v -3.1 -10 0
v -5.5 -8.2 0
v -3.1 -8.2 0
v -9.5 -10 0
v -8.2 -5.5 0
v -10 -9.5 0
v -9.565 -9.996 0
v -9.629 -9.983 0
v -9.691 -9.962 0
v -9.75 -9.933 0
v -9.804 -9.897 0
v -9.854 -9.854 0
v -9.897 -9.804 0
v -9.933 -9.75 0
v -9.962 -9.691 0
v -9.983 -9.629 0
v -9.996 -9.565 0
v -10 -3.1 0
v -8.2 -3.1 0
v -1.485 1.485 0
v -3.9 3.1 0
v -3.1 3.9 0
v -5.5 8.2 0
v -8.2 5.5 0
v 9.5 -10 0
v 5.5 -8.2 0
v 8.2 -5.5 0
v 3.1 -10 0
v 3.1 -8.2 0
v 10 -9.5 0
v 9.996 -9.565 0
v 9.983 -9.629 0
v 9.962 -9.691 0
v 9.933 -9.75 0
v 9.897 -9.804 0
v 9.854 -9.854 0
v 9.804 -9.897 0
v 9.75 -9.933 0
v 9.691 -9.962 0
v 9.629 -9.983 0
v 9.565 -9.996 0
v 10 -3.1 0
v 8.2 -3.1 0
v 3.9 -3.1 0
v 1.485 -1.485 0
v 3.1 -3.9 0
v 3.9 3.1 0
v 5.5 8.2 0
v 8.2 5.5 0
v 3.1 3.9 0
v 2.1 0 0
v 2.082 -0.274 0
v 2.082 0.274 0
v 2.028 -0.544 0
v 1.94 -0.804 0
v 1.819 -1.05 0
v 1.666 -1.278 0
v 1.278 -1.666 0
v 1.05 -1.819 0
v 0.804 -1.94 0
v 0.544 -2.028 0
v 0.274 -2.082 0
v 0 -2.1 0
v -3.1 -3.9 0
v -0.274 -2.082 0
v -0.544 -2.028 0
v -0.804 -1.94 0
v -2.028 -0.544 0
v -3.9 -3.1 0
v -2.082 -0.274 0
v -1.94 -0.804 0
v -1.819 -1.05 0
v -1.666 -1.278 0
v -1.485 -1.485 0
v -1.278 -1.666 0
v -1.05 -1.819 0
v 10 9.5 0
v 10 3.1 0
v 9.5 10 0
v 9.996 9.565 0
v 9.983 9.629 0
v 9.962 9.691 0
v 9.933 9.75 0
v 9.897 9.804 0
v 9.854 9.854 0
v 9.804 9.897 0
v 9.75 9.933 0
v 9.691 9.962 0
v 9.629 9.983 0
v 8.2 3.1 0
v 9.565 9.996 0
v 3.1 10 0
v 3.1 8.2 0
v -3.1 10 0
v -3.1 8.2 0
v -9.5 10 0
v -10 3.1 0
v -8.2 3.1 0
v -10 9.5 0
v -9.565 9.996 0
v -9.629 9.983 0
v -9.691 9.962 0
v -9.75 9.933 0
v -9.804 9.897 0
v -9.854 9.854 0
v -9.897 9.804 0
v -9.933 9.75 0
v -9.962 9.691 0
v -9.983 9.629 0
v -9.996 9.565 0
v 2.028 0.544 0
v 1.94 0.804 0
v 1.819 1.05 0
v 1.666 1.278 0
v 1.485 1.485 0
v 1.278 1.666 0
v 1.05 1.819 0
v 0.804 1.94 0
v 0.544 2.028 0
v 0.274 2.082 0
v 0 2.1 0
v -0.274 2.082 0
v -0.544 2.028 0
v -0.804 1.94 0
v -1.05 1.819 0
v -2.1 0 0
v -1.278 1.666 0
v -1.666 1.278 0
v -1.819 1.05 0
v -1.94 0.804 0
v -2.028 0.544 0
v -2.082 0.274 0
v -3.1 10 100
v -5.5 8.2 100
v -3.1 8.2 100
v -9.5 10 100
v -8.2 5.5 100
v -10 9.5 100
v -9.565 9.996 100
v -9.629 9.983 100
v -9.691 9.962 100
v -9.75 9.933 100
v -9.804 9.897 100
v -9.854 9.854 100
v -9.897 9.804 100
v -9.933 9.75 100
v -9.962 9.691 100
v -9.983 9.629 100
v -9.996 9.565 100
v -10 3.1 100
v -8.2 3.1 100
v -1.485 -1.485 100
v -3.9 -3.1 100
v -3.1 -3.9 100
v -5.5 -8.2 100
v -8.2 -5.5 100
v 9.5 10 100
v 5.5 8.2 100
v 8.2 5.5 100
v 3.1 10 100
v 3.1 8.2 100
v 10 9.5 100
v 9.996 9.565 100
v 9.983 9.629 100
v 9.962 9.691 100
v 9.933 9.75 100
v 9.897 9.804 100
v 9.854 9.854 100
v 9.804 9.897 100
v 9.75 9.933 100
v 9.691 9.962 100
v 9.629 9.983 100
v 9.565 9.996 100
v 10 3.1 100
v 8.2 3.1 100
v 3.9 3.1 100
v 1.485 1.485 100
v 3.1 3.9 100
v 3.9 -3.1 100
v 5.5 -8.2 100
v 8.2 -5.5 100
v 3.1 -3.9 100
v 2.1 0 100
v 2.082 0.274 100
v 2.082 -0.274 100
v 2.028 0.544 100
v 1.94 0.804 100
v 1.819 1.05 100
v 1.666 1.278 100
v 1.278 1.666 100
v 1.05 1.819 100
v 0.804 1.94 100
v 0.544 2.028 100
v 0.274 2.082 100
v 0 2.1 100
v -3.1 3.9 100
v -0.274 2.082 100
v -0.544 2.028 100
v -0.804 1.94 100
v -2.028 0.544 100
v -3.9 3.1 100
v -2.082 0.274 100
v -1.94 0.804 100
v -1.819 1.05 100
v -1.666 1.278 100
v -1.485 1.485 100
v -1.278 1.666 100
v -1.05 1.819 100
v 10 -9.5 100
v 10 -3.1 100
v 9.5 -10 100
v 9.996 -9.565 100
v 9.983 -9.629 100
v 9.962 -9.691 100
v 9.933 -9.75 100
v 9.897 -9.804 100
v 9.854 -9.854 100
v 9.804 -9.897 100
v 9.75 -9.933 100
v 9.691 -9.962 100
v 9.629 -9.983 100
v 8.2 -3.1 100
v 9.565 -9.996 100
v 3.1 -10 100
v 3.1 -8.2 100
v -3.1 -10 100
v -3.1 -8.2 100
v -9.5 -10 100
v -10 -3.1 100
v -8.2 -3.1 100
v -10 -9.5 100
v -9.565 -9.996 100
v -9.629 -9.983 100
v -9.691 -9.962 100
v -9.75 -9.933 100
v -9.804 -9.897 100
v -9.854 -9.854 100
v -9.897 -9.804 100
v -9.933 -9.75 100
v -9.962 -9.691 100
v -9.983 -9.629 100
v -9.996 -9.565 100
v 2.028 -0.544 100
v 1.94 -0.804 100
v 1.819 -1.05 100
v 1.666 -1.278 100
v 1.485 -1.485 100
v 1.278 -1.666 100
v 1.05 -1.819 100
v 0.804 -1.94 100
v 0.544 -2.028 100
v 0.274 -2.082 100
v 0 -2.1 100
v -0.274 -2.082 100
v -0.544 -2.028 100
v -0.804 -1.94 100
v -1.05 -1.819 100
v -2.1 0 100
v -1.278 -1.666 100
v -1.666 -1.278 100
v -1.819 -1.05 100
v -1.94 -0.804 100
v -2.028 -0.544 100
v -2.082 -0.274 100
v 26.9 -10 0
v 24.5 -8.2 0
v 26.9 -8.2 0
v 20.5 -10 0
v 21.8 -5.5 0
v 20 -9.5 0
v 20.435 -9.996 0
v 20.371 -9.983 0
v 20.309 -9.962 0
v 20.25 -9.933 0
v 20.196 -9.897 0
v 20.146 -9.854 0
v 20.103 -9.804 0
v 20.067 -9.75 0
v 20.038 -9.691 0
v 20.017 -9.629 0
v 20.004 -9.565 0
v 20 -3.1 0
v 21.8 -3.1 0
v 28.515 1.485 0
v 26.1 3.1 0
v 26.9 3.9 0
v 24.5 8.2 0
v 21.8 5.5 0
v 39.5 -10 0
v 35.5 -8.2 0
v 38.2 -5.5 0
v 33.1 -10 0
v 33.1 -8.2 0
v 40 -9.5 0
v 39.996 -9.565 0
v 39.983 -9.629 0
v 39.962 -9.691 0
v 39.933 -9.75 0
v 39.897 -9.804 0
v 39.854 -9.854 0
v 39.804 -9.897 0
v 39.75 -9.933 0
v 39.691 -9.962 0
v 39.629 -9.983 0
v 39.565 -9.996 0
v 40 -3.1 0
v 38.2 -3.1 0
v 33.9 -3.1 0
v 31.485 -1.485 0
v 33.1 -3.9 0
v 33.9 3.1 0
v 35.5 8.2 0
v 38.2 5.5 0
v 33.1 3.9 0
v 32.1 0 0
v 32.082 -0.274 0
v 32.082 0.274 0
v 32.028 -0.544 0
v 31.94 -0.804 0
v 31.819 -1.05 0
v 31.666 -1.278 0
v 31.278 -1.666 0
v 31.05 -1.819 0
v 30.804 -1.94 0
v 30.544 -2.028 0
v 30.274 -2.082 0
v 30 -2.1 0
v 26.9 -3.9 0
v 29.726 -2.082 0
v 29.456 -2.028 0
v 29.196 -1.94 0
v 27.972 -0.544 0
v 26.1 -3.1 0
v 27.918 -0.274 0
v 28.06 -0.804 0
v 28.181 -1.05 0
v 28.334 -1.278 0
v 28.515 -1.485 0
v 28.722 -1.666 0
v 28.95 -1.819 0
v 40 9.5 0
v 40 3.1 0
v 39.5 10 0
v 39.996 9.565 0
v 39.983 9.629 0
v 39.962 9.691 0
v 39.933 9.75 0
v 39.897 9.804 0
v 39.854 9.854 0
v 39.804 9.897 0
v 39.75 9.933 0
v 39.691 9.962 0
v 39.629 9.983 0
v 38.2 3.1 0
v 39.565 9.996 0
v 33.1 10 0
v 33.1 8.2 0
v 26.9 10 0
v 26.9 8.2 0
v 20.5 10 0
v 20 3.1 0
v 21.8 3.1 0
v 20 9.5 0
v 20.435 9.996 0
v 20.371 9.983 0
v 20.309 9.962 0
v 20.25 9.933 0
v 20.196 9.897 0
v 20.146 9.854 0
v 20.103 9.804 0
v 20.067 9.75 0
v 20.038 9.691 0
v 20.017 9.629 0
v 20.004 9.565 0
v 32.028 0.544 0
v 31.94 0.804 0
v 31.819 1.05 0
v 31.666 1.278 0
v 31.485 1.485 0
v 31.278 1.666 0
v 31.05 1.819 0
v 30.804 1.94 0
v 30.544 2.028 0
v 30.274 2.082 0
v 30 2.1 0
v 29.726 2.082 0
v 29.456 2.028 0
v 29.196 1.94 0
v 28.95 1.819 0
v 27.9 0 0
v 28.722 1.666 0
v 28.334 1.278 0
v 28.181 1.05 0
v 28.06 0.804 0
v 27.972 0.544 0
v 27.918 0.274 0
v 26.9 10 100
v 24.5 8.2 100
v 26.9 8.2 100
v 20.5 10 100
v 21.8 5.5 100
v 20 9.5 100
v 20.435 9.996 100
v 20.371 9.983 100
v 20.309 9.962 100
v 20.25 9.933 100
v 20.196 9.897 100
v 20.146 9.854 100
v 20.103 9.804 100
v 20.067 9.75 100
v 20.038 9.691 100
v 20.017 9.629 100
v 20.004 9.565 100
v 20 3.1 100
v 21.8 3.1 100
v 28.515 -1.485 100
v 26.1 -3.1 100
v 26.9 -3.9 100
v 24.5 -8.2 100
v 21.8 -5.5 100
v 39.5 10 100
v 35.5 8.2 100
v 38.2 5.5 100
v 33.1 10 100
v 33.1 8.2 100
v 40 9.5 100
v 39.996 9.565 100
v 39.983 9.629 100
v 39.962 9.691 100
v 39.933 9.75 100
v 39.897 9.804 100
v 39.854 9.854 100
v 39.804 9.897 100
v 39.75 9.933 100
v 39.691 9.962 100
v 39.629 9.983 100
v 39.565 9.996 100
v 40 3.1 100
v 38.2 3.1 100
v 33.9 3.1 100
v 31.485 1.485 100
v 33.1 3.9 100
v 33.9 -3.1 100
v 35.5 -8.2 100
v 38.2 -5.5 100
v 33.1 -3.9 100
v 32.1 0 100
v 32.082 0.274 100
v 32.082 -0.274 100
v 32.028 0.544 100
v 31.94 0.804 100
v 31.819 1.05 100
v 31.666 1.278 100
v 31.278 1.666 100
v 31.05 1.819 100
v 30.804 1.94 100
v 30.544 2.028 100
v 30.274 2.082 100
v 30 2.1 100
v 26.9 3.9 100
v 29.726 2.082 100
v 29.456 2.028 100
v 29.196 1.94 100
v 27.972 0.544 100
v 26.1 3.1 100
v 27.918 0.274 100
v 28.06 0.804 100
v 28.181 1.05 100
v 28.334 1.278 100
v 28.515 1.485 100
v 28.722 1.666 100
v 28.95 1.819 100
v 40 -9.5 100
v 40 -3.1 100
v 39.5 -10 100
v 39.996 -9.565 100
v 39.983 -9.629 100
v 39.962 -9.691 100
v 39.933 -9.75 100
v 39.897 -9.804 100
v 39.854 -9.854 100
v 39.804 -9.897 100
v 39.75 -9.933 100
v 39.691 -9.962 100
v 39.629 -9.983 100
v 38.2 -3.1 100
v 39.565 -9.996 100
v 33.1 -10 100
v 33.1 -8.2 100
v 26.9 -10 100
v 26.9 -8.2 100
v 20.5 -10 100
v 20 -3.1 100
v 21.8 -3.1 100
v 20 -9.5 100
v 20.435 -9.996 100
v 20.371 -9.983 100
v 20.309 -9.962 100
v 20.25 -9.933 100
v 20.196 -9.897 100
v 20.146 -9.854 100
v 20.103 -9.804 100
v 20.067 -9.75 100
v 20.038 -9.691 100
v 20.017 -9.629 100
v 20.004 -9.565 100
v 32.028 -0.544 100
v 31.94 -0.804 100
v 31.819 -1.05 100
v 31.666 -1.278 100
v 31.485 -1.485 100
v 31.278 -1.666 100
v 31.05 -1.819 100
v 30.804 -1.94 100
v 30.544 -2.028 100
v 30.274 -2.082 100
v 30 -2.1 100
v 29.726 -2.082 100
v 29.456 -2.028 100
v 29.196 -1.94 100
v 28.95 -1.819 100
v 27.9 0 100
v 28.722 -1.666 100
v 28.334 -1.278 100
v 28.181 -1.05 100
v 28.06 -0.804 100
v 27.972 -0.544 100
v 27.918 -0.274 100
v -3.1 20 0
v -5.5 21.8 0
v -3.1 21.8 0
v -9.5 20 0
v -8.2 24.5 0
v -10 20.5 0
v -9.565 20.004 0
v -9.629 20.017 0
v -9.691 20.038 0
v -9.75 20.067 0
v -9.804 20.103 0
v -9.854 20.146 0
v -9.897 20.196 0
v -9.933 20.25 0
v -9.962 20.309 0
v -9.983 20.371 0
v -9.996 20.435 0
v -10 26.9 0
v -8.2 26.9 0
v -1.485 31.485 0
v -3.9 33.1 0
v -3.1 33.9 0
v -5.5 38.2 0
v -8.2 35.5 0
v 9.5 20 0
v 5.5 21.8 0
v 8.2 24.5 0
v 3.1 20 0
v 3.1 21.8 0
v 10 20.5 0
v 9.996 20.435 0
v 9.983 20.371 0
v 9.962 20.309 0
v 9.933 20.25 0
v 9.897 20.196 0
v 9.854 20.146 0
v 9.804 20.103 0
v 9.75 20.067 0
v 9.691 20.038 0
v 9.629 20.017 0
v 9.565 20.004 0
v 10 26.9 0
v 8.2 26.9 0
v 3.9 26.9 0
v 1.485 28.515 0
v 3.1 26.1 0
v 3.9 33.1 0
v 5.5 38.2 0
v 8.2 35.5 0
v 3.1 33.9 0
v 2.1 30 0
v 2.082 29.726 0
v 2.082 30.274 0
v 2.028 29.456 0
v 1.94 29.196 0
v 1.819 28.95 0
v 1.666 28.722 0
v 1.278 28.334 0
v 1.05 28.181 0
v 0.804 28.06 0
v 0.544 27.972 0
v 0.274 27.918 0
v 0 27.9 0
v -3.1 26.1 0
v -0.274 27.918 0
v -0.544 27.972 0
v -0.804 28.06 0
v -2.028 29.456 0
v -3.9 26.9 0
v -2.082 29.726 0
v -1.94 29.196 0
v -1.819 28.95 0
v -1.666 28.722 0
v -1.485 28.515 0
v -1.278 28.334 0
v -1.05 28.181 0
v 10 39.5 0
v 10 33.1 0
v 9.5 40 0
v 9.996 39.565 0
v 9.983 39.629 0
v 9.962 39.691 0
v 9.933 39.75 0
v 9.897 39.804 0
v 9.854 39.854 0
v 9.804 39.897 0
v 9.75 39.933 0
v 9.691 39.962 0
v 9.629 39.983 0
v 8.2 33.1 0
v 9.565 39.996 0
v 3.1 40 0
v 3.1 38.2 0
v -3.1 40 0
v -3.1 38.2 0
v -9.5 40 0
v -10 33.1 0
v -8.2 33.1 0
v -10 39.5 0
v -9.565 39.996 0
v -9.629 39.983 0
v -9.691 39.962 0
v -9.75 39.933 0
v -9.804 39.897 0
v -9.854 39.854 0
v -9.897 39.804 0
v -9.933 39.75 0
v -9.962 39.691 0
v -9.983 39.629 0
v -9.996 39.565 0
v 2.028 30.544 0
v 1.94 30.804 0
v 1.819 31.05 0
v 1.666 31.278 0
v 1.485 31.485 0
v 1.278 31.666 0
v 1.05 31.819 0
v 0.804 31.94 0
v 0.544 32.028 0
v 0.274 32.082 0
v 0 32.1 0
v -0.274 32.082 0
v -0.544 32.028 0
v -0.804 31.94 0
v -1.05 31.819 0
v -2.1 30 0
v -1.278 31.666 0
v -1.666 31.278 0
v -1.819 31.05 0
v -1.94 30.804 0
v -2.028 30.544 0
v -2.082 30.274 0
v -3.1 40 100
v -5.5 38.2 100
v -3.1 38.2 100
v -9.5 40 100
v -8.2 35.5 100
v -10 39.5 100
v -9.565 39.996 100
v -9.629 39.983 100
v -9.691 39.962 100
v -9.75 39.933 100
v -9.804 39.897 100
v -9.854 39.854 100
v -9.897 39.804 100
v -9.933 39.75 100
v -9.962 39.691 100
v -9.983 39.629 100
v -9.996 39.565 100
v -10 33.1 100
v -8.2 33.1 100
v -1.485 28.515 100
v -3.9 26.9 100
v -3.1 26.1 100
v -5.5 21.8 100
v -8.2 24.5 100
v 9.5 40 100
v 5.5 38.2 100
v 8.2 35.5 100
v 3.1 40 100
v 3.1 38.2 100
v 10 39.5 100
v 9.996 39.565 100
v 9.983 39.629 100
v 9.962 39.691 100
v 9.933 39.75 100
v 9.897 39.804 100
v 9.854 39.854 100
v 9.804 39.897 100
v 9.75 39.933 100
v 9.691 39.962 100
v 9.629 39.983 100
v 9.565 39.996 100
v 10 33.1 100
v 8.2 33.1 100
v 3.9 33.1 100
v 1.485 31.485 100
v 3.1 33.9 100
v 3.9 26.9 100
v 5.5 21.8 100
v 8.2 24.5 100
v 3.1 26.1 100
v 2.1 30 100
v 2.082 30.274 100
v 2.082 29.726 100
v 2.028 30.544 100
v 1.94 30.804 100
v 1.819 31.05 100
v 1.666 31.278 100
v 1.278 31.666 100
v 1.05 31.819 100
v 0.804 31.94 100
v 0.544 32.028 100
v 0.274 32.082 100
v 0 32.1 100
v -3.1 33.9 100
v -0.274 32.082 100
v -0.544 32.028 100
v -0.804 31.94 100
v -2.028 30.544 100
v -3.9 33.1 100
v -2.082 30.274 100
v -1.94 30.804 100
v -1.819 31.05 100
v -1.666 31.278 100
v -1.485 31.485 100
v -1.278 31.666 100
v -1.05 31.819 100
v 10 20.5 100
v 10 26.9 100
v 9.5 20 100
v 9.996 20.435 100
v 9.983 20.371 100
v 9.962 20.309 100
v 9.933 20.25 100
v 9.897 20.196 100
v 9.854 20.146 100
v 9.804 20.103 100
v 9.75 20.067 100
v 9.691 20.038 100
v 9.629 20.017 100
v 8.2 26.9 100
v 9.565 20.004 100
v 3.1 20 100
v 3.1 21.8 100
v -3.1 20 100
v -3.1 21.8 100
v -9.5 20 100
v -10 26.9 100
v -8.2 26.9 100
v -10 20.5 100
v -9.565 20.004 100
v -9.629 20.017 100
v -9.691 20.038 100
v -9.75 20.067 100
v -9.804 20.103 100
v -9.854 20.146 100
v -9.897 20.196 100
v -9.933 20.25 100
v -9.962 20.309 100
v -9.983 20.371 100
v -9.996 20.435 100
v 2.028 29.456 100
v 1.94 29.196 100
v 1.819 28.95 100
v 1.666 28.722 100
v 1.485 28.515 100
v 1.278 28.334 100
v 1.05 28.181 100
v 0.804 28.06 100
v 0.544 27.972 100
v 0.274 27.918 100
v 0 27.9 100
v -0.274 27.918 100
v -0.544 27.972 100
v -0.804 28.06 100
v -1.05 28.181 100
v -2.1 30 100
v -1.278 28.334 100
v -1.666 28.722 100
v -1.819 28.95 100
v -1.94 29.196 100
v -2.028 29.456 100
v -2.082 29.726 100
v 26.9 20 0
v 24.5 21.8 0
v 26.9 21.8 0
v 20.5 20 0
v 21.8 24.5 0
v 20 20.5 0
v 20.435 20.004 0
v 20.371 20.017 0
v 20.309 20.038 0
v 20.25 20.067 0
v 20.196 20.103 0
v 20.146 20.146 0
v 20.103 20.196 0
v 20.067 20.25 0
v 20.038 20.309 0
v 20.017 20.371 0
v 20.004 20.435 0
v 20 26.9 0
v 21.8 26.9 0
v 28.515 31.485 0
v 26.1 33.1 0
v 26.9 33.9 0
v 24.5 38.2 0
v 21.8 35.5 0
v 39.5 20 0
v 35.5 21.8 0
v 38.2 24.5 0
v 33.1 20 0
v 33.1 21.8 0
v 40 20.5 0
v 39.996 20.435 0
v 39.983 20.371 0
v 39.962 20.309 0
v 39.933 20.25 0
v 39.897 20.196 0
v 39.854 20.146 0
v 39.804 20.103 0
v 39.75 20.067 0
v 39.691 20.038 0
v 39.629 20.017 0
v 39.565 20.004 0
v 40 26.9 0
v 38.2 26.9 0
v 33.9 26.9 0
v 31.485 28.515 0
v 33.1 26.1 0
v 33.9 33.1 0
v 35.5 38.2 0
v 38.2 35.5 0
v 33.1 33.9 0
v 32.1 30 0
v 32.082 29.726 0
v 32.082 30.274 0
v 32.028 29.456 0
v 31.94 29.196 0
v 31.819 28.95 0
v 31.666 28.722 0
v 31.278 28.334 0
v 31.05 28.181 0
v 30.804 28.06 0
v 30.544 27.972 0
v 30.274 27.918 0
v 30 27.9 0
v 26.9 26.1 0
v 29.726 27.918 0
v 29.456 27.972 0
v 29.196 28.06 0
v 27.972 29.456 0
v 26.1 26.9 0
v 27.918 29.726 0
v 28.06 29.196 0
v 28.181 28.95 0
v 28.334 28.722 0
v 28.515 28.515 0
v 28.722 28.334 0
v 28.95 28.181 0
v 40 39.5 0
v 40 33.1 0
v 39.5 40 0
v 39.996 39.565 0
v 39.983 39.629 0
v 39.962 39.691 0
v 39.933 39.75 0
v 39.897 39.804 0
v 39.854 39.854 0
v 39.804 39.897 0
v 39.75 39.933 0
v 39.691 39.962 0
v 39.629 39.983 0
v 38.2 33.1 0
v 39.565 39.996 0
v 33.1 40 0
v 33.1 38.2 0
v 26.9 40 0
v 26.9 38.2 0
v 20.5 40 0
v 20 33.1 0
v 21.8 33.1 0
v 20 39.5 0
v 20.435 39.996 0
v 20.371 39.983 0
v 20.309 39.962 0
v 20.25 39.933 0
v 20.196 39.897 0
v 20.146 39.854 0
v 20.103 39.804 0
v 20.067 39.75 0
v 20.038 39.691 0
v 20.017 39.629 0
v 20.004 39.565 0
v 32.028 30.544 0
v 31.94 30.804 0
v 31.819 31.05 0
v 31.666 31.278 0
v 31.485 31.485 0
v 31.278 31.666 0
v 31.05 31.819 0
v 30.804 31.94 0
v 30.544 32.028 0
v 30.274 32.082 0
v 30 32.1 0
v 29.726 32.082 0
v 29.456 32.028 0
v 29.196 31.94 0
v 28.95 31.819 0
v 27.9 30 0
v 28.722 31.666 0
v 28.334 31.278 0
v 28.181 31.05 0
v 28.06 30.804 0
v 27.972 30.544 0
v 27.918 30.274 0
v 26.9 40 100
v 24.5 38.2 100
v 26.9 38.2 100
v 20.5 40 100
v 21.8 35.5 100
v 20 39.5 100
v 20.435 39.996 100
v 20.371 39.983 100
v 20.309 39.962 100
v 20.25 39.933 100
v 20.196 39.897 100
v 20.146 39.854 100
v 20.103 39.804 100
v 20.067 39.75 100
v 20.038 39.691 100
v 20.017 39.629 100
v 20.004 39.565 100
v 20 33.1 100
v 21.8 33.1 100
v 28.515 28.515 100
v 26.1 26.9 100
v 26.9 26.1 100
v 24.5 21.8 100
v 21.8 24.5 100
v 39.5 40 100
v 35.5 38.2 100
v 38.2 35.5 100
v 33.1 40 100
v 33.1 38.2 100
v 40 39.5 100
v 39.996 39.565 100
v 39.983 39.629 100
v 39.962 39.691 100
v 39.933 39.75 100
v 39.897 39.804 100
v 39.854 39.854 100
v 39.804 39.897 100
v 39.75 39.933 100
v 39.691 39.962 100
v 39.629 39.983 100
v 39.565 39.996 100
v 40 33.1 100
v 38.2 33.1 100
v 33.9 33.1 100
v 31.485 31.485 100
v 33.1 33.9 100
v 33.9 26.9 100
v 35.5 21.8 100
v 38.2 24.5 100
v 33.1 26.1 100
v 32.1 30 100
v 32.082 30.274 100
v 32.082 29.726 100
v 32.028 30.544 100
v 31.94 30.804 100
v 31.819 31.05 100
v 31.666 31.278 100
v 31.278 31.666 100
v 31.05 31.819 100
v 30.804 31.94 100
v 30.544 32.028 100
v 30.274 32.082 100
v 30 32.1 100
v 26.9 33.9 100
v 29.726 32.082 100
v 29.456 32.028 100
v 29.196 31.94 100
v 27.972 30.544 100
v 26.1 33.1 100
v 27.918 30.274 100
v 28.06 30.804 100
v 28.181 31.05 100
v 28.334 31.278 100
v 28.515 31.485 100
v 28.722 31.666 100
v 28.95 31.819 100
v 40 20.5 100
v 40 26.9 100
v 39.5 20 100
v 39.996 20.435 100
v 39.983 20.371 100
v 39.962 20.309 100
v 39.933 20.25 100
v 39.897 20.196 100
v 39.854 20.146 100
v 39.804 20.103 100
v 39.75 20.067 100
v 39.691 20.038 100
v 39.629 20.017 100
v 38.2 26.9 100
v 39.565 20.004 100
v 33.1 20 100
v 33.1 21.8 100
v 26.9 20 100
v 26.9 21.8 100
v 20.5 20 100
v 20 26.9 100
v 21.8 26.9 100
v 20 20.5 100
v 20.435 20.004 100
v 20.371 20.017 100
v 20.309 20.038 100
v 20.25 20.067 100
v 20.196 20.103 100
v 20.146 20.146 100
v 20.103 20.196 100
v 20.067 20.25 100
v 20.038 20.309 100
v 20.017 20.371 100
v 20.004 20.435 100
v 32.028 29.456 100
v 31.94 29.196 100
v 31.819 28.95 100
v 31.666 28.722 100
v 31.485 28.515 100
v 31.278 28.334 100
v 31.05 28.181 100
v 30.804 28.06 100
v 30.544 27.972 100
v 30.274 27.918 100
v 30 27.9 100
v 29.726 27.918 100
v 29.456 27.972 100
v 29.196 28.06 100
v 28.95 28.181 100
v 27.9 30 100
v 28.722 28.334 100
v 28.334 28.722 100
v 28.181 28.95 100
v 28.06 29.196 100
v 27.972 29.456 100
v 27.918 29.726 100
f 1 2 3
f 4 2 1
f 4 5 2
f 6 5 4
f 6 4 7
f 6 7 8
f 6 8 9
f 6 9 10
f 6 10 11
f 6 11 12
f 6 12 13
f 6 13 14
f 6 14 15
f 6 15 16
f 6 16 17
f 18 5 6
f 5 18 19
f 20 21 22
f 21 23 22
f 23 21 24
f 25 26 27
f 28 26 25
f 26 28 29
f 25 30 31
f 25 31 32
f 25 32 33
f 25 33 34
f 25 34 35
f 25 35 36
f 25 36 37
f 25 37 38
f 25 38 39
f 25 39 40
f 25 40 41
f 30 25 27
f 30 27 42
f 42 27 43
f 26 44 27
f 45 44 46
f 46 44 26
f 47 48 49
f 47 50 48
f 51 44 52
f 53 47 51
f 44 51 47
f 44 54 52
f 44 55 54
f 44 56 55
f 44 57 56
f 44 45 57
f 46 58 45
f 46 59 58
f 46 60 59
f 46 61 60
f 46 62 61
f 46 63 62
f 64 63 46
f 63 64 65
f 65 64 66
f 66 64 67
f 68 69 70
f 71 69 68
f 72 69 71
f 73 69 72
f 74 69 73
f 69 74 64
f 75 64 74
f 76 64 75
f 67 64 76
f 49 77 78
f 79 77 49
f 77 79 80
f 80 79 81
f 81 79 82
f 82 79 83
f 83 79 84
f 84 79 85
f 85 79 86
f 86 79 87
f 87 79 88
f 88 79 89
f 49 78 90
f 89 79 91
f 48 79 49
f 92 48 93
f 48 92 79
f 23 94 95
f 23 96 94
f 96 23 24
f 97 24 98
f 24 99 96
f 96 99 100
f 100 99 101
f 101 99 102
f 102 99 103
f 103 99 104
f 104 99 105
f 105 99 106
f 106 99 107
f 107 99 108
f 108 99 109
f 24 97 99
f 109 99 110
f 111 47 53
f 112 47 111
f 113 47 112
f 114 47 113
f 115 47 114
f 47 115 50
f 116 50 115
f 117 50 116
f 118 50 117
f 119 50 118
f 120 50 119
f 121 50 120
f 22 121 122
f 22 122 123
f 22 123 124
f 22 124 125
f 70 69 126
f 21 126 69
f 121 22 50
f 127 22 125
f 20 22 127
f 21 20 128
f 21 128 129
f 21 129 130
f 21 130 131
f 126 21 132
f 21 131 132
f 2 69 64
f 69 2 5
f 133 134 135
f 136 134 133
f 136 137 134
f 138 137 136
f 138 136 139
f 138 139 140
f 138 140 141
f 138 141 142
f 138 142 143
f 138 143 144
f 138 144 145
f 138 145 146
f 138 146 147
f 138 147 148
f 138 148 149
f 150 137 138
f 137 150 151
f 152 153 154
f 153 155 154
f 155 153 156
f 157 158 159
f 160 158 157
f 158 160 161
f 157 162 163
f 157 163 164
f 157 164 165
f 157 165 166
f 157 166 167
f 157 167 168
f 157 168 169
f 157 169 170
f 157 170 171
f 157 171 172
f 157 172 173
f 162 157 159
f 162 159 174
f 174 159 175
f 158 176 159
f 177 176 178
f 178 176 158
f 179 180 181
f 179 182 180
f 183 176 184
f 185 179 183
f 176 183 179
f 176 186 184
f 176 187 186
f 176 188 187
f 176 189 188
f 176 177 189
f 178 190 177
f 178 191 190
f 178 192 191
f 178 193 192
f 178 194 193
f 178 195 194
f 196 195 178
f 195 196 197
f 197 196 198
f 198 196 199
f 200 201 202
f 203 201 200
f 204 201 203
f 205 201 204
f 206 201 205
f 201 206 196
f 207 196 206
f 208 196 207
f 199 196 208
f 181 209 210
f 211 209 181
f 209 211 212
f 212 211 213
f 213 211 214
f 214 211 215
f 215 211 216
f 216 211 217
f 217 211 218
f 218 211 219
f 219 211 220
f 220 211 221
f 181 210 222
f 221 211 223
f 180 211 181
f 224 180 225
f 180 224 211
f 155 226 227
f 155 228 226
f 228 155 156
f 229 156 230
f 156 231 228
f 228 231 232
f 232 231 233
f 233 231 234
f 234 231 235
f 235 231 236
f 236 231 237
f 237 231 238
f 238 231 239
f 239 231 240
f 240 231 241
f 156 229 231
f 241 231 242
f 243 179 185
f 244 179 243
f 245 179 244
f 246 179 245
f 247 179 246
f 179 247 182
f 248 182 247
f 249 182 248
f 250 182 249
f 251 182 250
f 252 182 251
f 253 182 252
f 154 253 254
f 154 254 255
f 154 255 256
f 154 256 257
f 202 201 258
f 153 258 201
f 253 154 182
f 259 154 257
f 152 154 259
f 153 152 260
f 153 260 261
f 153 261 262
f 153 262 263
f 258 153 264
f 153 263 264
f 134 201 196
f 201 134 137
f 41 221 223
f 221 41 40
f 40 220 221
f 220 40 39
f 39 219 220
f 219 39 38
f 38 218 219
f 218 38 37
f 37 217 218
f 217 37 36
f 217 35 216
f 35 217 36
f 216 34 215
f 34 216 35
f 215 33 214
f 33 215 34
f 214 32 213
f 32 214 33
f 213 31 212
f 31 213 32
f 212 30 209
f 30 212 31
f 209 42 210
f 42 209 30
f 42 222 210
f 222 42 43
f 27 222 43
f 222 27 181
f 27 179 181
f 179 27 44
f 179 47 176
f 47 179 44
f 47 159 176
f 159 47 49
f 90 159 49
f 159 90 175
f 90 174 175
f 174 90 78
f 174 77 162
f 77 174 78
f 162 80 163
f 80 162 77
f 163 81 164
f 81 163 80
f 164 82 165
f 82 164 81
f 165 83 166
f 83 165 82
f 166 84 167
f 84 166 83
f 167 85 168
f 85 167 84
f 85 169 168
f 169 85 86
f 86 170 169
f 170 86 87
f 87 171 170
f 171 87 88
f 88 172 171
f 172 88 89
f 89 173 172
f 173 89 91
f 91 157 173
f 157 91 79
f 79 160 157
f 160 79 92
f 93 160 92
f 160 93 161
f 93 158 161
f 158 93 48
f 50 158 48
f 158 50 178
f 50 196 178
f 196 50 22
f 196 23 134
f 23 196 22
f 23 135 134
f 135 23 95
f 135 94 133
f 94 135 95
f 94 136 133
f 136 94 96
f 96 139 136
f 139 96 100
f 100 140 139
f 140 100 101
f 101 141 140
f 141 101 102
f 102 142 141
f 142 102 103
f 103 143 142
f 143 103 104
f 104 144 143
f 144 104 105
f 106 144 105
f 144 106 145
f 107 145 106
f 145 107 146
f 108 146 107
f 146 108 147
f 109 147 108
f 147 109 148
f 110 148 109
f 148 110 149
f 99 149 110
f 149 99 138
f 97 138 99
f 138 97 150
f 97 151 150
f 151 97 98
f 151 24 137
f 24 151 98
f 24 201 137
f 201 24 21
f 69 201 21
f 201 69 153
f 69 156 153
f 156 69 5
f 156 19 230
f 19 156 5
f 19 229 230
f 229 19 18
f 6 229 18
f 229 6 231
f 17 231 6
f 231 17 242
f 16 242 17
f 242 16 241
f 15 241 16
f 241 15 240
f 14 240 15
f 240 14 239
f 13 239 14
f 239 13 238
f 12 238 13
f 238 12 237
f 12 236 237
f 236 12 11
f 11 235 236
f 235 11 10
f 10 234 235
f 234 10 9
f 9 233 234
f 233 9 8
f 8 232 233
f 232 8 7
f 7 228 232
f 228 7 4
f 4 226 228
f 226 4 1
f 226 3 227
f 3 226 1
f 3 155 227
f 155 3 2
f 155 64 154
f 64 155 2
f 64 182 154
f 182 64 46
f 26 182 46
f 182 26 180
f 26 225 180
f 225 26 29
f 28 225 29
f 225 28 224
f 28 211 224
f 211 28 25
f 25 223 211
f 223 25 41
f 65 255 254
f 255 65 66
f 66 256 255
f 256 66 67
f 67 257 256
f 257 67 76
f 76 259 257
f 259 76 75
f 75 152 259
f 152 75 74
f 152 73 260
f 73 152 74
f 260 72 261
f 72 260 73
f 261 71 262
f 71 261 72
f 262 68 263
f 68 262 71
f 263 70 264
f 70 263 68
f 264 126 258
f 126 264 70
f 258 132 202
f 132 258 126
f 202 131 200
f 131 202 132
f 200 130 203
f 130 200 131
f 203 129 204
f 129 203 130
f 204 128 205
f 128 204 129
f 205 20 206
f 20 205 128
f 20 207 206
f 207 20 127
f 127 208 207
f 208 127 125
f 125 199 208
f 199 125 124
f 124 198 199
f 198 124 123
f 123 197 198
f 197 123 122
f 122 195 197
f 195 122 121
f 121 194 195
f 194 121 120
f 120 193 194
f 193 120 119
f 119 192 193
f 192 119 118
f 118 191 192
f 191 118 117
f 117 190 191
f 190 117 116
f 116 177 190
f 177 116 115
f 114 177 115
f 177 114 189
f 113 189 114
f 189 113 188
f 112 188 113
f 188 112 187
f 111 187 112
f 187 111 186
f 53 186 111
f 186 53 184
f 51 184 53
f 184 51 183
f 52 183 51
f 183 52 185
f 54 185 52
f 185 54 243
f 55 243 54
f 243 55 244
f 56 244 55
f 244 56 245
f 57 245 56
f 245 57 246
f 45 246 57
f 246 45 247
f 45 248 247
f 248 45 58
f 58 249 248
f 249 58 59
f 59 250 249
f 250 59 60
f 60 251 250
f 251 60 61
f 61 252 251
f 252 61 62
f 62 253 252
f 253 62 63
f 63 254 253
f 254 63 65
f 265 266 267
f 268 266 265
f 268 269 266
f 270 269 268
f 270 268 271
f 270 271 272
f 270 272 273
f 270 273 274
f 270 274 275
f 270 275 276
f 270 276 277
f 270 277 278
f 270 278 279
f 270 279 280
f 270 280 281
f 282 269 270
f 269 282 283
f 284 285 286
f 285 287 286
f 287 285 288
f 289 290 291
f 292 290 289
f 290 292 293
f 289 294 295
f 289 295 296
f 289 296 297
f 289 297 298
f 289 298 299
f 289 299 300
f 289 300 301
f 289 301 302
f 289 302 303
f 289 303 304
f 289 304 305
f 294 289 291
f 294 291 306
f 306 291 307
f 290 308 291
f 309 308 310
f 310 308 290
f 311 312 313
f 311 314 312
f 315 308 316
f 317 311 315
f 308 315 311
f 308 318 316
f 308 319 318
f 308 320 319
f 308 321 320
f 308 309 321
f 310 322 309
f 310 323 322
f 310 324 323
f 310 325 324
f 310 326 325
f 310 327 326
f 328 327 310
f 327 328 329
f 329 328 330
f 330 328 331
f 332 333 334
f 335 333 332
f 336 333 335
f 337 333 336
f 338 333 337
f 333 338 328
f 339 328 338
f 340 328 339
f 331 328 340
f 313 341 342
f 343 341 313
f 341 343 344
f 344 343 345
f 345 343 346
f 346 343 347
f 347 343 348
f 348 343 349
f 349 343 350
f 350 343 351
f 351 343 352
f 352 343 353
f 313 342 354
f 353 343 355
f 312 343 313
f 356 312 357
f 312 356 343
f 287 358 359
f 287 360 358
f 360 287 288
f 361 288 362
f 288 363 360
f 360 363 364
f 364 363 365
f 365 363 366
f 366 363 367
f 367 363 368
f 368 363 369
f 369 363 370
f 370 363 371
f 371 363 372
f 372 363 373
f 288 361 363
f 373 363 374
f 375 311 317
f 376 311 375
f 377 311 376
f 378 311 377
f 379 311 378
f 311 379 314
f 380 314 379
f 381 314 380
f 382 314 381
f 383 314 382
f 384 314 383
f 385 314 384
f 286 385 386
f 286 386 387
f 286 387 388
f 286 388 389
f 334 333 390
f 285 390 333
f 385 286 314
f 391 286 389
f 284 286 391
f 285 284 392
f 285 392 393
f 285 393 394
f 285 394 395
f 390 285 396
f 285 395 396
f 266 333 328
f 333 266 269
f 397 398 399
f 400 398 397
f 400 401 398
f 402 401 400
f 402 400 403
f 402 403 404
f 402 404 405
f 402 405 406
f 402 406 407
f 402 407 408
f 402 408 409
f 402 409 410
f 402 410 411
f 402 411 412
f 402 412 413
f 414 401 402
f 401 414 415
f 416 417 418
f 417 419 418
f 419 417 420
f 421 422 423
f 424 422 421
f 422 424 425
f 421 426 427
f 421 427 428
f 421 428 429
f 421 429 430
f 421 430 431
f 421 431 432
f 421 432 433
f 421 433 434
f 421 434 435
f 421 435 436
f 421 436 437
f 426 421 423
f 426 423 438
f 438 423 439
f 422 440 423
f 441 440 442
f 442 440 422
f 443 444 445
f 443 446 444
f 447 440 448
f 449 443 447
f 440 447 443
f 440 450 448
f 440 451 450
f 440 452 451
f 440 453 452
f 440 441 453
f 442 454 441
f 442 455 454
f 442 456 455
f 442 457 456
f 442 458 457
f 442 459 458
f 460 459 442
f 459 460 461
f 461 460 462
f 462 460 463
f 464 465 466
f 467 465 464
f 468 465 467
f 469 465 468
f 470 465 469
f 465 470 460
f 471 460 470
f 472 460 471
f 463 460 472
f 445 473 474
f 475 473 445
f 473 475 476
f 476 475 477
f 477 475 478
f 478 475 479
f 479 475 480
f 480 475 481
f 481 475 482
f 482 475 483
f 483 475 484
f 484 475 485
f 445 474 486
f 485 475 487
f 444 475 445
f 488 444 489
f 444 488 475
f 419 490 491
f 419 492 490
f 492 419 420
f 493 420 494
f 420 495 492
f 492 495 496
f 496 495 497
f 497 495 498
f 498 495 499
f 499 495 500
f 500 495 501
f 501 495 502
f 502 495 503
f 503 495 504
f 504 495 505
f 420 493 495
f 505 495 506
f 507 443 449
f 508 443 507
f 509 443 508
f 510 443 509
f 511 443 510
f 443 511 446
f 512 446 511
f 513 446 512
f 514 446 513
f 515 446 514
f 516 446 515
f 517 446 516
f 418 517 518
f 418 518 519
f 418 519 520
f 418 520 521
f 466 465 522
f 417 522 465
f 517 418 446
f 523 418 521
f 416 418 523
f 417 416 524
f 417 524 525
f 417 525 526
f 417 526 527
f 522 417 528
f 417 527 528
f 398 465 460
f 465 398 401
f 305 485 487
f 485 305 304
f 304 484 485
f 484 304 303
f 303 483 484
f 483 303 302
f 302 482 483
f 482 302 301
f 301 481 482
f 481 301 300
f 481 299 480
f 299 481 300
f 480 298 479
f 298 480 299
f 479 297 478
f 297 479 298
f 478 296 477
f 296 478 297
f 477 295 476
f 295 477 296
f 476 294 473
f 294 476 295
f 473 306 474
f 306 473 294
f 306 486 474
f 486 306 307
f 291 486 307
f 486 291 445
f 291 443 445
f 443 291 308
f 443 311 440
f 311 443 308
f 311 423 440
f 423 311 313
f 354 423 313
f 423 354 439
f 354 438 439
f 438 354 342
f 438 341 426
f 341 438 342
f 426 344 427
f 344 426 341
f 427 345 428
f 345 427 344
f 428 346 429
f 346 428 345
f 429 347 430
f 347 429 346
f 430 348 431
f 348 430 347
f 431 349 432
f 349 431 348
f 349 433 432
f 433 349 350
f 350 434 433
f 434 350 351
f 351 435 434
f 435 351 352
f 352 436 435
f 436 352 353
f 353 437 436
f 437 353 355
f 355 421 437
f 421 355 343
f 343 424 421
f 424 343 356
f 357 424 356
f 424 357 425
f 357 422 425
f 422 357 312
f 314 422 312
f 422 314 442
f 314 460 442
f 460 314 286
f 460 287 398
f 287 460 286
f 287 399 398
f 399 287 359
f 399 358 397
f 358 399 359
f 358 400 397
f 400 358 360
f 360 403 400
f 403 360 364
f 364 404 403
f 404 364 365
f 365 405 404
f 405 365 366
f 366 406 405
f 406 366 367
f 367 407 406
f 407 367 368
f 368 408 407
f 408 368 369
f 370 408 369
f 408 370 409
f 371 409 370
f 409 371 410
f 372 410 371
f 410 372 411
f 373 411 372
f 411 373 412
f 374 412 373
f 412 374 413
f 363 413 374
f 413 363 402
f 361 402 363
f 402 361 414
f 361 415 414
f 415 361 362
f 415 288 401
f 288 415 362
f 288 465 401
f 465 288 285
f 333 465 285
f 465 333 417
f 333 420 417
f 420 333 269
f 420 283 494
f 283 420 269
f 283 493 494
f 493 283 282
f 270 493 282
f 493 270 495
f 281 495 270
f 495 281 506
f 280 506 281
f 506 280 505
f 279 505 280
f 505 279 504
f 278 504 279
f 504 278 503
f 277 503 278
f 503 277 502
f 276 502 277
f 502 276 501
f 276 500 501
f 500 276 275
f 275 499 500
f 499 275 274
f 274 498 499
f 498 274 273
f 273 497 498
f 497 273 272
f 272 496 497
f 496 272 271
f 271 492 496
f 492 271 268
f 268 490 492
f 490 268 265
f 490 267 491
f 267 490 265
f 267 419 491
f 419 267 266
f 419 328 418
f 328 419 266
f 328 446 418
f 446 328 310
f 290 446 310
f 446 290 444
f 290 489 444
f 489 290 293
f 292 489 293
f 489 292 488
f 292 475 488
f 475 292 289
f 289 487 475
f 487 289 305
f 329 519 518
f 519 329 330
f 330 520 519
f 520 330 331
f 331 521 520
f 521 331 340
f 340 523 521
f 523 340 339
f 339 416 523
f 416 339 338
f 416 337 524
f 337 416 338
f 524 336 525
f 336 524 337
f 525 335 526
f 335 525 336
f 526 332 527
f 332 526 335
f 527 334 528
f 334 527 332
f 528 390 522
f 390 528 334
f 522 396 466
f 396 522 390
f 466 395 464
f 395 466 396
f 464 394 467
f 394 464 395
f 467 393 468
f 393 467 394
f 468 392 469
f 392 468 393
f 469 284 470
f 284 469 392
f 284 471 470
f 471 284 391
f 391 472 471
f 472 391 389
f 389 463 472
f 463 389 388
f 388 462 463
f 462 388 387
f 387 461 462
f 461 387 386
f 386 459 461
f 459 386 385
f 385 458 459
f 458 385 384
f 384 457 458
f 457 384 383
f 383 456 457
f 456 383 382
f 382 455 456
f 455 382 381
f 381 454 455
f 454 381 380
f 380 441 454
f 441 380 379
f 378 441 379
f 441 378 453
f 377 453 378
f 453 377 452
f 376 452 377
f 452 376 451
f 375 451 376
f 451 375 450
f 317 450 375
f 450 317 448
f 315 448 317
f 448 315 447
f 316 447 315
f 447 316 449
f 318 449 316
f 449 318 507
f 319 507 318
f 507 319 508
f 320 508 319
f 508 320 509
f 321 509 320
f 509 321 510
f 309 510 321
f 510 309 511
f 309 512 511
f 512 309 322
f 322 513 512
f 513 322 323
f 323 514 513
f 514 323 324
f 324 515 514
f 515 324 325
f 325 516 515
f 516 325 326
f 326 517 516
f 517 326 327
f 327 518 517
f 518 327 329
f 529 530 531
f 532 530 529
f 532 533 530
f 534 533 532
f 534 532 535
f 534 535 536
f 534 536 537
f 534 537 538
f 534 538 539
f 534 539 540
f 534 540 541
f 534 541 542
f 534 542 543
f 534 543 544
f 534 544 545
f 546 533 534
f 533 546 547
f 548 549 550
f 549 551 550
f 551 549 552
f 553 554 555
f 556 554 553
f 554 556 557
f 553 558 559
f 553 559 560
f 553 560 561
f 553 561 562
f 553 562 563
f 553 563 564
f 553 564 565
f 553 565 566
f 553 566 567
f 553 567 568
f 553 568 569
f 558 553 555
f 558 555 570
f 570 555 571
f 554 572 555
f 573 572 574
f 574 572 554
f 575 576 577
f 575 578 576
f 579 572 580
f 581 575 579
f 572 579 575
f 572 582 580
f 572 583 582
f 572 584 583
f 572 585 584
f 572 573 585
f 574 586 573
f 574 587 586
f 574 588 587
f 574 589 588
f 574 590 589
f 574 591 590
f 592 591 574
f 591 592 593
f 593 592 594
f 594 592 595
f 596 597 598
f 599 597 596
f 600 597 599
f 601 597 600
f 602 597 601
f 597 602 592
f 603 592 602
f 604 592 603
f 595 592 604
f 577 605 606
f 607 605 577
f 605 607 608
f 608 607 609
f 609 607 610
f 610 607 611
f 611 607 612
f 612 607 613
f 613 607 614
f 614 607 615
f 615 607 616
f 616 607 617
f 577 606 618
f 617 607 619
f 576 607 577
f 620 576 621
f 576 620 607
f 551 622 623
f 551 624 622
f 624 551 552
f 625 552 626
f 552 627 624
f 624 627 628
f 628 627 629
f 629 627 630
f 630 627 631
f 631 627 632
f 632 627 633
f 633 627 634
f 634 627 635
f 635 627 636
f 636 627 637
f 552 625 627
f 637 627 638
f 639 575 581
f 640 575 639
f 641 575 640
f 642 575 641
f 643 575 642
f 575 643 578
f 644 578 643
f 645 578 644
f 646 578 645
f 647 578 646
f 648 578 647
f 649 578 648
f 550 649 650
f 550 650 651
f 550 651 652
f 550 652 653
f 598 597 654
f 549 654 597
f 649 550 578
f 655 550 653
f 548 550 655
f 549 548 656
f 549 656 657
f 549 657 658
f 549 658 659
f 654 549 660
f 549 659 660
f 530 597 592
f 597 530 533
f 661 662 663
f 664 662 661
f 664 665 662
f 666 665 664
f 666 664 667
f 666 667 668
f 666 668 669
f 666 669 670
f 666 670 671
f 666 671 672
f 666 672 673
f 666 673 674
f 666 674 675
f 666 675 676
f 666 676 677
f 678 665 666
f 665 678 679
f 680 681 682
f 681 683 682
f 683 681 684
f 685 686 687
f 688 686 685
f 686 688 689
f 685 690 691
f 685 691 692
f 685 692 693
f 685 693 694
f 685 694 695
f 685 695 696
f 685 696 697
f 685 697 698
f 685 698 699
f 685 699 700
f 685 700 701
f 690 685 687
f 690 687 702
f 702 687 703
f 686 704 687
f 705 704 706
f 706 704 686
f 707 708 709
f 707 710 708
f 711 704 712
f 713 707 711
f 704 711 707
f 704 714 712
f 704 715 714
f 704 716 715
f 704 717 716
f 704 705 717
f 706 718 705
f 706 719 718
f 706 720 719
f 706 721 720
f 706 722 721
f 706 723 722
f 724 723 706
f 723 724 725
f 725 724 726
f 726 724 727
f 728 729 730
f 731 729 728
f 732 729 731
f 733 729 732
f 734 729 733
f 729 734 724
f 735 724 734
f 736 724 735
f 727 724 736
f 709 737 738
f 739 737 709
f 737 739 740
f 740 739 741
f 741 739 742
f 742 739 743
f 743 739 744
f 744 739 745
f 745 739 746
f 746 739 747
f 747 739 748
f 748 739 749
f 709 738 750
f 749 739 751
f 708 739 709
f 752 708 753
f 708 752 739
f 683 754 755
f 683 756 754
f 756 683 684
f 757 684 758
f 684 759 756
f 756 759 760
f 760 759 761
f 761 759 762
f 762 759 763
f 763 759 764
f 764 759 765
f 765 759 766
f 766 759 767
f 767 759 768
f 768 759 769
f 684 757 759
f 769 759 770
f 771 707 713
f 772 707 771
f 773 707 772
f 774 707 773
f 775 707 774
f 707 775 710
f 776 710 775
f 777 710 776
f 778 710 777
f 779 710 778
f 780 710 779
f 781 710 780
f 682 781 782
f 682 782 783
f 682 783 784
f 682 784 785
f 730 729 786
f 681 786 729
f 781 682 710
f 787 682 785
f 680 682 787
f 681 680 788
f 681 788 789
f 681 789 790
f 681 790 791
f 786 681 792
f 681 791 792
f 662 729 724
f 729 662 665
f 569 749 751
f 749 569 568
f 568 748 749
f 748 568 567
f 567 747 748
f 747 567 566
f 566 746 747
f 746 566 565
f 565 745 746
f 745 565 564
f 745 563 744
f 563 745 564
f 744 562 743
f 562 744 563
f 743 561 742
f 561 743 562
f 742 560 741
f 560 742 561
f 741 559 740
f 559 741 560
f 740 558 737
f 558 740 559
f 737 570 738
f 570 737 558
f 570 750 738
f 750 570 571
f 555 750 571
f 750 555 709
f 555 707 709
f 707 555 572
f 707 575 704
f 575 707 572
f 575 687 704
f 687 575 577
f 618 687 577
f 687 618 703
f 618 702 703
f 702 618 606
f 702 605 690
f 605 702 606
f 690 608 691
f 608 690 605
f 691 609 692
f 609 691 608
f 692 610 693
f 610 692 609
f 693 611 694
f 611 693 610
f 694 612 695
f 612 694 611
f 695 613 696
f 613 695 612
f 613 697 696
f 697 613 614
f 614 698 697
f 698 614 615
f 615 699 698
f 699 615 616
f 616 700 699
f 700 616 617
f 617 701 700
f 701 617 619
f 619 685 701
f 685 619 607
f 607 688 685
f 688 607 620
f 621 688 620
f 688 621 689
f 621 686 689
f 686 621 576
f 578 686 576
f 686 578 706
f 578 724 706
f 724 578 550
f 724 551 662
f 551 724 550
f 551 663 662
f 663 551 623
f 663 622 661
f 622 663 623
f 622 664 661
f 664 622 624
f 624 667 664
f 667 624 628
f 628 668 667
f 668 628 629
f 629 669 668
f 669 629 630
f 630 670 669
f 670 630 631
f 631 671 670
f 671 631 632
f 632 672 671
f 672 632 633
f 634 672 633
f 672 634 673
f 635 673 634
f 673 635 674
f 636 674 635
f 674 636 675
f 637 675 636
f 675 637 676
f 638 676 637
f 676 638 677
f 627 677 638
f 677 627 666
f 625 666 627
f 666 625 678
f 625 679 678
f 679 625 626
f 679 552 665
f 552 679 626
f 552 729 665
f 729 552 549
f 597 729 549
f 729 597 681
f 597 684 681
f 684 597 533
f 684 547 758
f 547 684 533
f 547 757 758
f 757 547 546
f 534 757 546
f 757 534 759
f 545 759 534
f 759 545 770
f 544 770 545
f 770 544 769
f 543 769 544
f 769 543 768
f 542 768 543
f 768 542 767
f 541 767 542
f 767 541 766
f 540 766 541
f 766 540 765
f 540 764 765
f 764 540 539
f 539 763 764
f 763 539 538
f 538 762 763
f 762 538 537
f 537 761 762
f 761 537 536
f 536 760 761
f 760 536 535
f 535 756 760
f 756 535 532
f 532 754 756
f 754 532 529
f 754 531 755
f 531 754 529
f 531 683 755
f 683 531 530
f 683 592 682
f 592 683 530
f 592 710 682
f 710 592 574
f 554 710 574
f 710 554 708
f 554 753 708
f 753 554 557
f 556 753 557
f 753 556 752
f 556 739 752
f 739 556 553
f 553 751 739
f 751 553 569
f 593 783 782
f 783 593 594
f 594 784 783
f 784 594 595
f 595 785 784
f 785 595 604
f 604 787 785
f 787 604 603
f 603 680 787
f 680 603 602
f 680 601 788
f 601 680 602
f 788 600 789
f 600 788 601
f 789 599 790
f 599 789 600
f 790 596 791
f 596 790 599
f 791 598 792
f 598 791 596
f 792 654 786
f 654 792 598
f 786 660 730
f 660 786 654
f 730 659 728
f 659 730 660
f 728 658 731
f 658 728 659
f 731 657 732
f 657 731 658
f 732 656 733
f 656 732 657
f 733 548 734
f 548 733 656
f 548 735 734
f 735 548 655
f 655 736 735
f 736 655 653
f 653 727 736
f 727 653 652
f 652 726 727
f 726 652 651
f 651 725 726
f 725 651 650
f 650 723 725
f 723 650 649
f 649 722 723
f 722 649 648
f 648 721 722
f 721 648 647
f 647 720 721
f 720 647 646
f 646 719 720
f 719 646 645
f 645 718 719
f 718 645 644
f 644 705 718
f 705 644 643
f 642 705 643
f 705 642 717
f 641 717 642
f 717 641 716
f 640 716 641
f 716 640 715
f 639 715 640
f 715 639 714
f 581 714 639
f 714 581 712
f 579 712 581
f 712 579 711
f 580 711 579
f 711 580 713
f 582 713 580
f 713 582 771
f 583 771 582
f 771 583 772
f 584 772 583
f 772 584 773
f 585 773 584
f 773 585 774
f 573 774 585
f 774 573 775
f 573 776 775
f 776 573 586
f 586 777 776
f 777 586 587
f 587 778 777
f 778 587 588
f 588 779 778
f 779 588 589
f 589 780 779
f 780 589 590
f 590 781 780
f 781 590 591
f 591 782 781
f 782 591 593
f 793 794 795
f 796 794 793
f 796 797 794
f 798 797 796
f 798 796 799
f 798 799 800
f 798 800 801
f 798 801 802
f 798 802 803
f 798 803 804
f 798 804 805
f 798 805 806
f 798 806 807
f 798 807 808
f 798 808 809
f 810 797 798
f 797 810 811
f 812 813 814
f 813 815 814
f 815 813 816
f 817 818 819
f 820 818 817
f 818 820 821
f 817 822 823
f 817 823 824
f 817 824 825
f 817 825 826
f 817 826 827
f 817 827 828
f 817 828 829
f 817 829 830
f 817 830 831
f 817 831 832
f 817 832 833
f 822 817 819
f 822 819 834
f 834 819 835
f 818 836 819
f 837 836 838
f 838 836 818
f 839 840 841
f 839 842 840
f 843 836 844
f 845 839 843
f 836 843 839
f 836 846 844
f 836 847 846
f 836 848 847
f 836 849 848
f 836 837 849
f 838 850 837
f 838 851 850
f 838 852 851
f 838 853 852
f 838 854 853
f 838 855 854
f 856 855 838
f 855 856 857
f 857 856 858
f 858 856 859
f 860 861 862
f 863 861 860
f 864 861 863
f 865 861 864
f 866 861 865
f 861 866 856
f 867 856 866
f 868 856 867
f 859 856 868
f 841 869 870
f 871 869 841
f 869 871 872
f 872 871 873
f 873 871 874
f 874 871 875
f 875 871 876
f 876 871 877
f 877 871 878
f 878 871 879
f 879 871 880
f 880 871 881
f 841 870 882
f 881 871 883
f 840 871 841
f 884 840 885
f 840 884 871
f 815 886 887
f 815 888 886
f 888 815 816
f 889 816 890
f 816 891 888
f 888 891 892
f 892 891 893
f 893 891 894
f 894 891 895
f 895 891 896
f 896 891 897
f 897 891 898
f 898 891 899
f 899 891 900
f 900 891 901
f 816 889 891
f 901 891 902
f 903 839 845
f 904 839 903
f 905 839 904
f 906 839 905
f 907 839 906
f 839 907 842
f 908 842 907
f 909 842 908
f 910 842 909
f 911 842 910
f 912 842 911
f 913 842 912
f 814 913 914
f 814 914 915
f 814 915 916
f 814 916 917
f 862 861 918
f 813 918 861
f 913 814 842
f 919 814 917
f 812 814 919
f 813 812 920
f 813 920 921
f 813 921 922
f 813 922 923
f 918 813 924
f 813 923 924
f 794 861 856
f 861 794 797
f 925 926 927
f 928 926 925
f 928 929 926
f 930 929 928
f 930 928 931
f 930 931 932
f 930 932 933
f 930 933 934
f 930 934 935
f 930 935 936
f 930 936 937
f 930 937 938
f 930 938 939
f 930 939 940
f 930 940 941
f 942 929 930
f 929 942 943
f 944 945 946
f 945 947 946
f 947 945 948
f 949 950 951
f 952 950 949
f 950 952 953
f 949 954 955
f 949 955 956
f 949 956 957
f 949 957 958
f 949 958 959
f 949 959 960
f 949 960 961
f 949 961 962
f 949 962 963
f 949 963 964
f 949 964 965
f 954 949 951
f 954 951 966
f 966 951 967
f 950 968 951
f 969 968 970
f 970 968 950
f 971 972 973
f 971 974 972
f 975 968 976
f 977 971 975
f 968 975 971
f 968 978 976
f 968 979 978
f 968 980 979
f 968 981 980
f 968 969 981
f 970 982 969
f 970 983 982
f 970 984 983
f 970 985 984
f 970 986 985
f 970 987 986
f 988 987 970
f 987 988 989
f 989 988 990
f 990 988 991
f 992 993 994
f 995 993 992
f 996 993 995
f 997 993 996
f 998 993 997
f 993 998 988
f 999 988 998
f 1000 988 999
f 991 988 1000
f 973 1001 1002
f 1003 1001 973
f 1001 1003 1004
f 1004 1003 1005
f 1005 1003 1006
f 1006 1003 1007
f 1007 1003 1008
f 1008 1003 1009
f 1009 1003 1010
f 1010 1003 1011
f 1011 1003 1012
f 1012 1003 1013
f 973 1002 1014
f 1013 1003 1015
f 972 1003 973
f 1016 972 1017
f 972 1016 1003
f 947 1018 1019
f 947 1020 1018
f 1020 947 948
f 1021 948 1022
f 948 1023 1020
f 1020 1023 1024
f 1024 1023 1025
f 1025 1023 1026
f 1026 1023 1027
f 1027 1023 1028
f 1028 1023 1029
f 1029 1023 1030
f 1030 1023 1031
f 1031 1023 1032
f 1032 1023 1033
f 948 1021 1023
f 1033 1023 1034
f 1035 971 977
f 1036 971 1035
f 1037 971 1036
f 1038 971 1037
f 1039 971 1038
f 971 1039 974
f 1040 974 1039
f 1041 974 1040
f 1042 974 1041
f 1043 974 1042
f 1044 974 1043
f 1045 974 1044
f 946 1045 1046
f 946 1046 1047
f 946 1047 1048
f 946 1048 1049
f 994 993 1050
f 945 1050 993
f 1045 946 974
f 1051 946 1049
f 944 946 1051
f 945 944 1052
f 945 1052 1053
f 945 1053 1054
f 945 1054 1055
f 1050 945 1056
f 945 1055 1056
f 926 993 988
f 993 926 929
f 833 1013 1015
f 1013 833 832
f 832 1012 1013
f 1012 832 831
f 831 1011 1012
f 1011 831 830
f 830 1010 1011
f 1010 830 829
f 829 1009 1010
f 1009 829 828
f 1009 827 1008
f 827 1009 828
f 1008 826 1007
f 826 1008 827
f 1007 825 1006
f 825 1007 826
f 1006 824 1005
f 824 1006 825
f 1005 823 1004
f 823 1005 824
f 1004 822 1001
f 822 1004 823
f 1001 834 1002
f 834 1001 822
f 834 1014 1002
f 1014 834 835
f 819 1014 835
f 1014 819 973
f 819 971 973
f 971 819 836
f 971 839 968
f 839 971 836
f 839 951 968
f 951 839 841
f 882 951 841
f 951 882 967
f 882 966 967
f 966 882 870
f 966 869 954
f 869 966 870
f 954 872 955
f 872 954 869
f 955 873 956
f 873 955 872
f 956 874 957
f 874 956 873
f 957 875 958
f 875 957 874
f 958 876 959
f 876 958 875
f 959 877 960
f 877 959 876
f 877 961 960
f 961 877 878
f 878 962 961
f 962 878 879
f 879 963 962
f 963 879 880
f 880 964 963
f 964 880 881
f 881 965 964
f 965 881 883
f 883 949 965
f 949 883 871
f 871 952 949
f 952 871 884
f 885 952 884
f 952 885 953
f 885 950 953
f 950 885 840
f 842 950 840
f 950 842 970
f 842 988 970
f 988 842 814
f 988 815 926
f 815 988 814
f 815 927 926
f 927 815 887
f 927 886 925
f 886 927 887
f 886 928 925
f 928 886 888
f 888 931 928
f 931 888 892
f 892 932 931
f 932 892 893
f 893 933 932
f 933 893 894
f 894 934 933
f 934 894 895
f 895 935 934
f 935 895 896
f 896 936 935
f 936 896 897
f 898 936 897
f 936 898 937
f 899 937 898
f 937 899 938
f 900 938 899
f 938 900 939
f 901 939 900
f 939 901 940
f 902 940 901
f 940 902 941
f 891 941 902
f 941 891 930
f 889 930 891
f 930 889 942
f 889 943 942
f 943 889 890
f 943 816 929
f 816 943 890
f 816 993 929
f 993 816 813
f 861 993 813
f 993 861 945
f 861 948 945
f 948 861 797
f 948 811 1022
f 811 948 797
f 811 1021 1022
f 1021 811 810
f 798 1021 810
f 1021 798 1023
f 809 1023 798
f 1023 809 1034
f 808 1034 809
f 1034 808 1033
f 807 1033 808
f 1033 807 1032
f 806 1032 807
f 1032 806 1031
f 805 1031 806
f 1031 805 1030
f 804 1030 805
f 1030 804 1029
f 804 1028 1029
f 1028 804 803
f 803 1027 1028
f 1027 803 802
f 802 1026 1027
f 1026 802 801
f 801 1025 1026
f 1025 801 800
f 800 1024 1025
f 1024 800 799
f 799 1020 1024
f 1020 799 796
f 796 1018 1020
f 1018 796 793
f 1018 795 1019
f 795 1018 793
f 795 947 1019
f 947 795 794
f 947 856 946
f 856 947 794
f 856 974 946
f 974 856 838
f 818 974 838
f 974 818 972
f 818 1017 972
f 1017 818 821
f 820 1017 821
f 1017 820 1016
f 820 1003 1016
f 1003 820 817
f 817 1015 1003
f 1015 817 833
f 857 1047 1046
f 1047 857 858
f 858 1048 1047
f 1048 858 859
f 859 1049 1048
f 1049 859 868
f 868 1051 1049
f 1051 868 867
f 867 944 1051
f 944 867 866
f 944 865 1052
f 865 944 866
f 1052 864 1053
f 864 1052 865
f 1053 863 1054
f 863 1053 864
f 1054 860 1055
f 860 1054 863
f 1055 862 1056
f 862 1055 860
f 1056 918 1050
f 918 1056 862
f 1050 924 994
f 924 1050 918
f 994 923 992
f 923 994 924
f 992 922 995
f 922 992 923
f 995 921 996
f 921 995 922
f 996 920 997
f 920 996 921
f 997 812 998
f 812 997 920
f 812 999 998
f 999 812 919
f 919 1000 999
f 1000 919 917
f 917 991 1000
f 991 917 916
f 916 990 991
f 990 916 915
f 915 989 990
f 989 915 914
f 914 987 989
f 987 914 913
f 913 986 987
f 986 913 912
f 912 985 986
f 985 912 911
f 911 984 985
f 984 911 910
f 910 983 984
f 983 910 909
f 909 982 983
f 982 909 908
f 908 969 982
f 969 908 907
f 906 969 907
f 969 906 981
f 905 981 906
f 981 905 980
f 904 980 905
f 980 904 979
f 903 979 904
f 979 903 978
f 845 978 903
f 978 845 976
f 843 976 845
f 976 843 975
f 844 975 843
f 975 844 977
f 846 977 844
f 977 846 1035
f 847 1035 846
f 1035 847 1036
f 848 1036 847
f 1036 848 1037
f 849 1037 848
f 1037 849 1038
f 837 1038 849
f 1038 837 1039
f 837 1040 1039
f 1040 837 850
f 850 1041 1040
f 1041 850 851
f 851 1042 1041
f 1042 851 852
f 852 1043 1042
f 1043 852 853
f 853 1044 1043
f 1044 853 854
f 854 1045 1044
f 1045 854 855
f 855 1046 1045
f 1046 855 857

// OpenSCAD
// 2020-Nutprofil (Typ B, 6-mm-Nut) zum Hochkant-Drucken
// Hochkant gedruckt sind alle Waende senkrecht: keine Ueberhaenge, keine Stuetzen.

laenge     = 100;   // mm
anzahl     = 4;     // Stueck auf der Platte
abstand    = 10;    // Abstand zwischen den Teilen
a          = 20;    // Kantenlaenge
nut        = 6.2;   // Nutoeffnung
lippe      = 1.8;   // Wandstaerke an der Nut
nut_tiefe  = 6.1;   // Tiefe der Nut ab Aussenkante
kammer     = 11;    // Breite der Kammer hinter der Lippe
kern_loch  = 4.2;   // Kernloch (M5-Gewinde schneiden)

$fn = 48;

module querschnitt() {
    difference() {
        offset(r=0.5) offset(delta=-0.5) square(a, center=true);
        for (r = [0, 90, 180, 270]) rotate(r) {
            // Nutoeffnung
            translate([-nut/2, a/2 - lippe - 0.01]) square([nut, lippe + 1]);
            // T-Kammer (trapezfoermig, zum Kern hin schmaler)
            polygon([[-kammer/2, a/2 - lippe], [kammer/2, a/2 - lippe],
                     [nut/2, a/2 - nut_tiefe], [-nut/2, a/2 - nut_tiefe]]);
        }
        circle(d=kern_loch);
    }
}

for (i = [0:anzahl-1])
    translate([(i % 2) * (a + abstand), floor(i / 2) * (a + abstand), 0])
        linear_extrude(laenge) querschnitt();
